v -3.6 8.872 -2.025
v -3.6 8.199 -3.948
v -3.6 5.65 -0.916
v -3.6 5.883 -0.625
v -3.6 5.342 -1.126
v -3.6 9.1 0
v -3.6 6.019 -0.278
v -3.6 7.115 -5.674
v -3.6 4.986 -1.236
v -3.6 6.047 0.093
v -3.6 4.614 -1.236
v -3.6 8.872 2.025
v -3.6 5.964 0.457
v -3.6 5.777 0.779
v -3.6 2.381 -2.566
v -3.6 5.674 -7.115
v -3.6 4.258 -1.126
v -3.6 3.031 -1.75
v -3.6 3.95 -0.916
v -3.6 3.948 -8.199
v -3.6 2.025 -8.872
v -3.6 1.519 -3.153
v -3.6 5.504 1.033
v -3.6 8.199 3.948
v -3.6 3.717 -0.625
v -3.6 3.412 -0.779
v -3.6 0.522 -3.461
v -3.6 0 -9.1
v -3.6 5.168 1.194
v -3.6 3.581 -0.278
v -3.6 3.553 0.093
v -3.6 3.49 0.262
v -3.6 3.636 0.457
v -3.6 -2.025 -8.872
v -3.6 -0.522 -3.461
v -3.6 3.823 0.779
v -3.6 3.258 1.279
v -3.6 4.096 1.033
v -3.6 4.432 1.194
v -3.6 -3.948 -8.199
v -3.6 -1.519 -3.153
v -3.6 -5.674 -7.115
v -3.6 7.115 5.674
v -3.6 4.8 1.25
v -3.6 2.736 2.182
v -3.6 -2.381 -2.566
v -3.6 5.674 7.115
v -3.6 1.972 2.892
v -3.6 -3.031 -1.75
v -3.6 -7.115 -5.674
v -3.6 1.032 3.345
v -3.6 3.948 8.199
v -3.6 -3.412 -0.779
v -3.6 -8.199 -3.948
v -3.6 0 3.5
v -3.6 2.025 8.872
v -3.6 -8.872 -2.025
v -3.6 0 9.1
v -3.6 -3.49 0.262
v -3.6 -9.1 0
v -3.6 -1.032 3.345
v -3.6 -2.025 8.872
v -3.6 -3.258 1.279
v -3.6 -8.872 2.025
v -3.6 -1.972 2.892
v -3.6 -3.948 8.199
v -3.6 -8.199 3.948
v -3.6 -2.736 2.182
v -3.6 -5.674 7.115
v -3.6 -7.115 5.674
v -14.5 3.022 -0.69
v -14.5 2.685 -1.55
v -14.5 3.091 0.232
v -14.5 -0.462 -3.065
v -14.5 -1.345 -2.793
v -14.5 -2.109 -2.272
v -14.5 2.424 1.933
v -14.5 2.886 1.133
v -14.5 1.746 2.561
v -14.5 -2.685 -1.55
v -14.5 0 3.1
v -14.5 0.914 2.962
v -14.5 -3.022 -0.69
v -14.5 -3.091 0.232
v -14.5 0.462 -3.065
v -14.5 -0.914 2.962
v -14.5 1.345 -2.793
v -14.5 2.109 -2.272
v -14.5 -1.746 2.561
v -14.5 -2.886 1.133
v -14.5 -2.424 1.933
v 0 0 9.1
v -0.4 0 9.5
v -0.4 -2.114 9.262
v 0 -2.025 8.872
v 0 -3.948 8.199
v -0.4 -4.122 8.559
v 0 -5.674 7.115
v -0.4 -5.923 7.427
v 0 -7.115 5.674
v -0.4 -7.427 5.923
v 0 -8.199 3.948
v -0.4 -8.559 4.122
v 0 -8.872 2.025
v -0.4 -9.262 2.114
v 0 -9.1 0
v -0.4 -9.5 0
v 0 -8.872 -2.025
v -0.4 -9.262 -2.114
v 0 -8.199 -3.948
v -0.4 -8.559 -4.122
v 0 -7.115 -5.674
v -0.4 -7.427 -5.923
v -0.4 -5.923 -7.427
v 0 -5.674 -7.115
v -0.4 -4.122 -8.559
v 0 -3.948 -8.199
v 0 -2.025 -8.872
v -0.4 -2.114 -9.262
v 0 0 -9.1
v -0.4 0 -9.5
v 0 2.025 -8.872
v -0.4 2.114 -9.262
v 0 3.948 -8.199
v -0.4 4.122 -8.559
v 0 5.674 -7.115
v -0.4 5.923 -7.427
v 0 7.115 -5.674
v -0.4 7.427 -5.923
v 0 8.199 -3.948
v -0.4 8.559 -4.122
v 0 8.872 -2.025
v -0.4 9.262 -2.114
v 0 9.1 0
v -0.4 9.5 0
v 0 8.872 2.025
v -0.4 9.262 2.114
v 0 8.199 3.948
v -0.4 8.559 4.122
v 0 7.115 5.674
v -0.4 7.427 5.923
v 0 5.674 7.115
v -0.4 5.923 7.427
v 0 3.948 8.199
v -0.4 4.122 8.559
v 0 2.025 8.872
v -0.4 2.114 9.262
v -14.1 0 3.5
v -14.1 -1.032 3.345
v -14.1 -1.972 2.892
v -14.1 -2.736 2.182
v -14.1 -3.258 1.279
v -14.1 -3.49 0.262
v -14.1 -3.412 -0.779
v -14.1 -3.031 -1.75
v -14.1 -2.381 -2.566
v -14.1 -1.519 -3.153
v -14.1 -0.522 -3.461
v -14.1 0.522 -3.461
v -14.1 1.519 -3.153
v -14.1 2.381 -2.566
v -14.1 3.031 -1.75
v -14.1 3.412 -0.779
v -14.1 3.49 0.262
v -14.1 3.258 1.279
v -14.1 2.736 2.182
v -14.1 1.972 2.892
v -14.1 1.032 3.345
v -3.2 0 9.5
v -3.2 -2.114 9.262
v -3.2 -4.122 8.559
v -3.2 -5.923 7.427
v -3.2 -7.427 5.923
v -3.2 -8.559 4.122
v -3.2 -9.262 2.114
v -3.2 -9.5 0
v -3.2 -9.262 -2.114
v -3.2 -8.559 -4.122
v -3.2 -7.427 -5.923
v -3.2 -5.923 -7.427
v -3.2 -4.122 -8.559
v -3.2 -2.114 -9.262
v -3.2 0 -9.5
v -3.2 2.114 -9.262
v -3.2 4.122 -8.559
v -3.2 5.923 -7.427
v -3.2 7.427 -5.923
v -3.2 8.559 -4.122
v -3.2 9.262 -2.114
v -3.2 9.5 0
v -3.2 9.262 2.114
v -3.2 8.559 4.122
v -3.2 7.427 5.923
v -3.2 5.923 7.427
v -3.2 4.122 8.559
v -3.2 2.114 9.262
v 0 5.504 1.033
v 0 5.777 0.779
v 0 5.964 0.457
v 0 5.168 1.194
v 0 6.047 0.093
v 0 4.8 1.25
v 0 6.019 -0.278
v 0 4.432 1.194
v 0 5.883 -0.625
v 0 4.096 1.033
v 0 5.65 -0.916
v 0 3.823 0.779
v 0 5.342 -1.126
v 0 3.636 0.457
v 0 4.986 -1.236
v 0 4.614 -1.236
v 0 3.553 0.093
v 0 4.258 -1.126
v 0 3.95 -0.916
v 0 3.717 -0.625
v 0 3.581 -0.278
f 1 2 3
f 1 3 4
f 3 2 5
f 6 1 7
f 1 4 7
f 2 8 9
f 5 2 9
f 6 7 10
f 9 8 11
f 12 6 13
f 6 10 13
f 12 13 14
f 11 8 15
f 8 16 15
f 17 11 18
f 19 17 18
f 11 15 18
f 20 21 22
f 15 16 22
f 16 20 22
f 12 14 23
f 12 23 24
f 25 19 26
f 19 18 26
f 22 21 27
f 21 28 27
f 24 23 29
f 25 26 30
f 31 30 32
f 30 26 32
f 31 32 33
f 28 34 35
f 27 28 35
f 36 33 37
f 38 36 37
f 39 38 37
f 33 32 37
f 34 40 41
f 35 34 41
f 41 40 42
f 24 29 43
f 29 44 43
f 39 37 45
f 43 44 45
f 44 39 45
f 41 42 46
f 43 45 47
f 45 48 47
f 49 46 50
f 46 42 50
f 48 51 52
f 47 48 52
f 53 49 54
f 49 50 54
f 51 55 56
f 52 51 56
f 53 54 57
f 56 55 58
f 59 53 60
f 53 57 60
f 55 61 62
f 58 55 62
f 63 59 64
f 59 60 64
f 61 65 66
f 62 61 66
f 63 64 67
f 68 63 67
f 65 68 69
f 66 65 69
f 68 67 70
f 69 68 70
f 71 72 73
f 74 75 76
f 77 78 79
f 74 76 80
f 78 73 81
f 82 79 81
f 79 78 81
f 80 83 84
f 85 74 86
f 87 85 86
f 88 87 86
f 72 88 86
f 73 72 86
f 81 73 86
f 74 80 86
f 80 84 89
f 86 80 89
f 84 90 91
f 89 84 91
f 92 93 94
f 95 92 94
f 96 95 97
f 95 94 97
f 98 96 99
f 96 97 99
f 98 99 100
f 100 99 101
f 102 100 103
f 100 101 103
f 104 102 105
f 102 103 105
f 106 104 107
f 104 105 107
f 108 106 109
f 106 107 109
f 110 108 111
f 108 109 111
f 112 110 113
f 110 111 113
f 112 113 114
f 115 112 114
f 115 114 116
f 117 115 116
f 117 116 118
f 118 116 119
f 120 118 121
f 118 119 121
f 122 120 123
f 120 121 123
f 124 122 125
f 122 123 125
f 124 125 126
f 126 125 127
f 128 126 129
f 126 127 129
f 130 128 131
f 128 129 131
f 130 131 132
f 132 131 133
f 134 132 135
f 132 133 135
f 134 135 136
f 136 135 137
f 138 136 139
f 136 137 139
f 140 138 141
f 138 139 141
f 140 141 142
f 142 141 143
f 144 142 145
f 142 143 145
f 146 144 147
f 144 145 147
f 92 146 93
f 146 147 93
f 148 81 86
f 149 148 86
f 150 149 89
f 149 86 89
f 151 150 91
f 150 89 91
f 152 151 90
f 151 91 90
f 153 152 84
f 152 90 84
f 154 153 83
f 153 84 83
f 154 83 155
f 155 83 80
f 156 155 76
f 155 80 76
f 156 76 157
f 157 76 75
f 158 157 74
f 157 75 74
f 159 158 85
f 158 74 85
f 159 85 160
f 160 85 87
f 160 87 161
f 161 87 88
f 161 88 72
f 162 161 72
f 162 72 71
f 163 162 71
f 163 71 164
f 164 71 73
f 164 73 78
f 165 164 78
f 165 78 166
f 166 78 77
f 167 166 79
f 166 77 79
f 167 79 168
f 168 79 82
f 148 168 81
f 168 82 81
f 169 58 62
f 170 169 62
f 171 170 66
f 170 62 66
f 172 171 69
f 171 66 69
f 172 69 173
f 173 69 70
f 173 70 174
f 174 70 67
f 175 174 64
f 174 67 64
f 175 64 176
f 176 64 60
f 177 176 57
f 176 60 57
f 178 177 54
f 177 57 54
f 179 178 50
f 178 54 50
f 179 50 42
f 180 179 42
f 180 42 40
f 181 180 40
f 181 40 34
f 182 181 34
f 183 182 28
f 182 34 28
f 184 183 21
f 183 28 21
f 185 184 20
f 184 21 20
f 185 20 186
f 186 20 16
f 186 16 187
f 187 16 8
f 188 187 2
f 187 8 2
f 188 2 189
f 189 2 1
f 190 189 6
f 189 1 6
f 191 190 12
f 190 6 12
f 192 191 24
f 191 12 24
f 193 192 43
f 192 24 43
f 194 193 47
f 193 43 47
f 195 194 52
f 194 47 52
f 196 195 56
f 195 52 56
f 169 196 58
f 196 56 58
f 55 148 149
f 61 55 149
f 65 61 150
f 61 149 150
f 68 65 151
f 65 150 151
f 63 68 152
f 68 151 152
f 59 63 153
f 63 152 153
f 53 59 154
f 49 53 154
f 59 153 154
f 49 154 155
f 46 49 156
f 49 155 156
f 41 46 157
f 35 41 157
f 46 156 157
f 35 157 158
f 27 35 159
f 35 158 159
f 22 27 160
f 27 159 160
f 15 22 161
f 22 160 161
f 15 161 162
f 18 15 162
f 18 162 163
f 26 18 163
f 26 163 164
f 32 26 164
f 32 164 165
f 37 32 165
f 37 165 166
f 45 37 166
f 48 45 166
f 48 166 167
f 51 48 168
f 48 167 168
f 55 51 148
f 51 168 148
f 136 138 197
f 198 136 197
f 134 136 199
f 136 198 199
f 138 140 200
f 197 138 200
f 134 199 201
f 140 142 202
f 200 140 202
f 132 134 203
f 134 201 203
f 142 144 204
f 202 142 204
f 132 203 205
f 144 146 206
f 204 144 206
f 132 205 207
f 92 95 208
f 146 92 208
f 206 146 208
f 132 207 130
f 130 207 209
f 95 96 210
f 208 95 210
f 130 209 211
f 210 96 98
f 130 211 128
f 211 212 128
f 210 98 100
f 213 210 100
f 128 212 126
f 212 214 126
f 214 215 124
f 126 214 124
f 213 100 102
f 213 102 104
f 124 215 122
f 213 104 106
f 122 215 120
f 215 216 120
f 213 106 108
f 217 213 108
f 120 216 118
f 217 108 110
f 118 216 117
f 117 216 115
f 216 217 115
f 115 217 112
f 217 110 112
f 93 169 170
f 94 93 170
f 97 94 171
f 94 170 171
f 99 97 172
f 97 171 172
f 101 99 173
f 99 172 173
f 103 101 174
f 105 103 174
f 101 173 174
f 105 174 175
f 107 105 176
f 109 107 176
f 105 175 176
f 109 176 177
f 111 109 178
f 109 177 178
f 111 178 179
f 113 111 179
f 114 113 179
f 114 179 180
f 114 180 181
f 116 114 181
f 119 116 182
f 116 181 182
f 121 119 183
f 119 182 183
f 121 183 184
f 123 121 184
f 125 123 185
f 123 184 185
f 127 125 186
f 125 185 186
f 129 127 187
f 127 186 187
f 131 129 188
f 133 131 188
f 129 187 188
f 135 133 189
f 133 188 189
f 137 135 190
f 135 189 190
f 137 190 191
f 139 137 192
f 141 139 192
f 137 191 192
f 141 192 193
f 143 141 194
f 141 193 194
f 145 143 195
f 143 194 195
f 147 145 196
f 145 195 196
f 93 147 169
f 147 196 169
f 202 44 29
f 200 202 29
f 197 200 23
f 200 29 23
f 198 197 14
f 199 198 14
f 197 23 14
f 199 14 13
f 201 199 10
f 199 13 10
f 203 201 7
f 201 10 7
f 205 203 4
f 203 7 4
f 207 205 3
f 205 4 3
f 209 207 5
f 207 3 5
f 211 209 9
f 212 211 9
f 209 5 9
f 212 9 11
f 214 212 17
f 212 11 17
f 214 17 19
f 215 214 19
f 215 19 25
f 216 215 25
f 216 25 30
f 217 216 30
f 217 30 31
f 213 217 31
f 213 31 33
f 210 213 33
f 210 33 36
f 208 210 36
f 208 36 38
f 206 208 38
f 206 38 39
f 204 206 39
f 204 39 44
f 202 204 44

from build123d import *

# Parameters (mm, degrees)
SKETCH_3_R          = 1.25
CUT_EXTRUDE_1_DEPTH = 18.300578025
CHAMFER_1_SIZE      = 0.4


with BuildPart() as part:
    # Эскиз2 → Повернуть1 (revolve)
    with BuildSketch(Plane.XY, mode=Mode.PRIVATE) as revolve_1_sk:
        Polygon((0, 0), (0, 9.5), (-3.6, 9.5), (-3.6, 3.5), (-14.5, 3.5), (-14.5, 0), align=None)
    revolve(revolve_1_sk.sketch.rotate(Axis((-14.5, 0, 0), (1, 0, 0)), 90), axis=Axis((-14.5, 0, 0), (1, 0, 0)))

    # Эскиз3 → Вырез-Вытянуть1 (cut, through all)
    with BuildSketch(Plane.ZY.offset(3.6)):
        with Locations((0, 4.8)):
            Circle(SKETCH_3_R)
    extrude(amount=-CUT_EXTRUDE_1_DEPTH, mode=Mode.SUBTRACT)

    # Фаска1
    chamfer_1_edges = [part.edges().sort_by_distance(p)[0] for p in [
        (-14.5, 0, -3.5),
        (-3.6, 0, -9.5),
        (0, 0, -9.5),
    ]]
    chamfer(chamfer_1_edges, length=CHAMFER_1_SIZE)


solid = part.part
